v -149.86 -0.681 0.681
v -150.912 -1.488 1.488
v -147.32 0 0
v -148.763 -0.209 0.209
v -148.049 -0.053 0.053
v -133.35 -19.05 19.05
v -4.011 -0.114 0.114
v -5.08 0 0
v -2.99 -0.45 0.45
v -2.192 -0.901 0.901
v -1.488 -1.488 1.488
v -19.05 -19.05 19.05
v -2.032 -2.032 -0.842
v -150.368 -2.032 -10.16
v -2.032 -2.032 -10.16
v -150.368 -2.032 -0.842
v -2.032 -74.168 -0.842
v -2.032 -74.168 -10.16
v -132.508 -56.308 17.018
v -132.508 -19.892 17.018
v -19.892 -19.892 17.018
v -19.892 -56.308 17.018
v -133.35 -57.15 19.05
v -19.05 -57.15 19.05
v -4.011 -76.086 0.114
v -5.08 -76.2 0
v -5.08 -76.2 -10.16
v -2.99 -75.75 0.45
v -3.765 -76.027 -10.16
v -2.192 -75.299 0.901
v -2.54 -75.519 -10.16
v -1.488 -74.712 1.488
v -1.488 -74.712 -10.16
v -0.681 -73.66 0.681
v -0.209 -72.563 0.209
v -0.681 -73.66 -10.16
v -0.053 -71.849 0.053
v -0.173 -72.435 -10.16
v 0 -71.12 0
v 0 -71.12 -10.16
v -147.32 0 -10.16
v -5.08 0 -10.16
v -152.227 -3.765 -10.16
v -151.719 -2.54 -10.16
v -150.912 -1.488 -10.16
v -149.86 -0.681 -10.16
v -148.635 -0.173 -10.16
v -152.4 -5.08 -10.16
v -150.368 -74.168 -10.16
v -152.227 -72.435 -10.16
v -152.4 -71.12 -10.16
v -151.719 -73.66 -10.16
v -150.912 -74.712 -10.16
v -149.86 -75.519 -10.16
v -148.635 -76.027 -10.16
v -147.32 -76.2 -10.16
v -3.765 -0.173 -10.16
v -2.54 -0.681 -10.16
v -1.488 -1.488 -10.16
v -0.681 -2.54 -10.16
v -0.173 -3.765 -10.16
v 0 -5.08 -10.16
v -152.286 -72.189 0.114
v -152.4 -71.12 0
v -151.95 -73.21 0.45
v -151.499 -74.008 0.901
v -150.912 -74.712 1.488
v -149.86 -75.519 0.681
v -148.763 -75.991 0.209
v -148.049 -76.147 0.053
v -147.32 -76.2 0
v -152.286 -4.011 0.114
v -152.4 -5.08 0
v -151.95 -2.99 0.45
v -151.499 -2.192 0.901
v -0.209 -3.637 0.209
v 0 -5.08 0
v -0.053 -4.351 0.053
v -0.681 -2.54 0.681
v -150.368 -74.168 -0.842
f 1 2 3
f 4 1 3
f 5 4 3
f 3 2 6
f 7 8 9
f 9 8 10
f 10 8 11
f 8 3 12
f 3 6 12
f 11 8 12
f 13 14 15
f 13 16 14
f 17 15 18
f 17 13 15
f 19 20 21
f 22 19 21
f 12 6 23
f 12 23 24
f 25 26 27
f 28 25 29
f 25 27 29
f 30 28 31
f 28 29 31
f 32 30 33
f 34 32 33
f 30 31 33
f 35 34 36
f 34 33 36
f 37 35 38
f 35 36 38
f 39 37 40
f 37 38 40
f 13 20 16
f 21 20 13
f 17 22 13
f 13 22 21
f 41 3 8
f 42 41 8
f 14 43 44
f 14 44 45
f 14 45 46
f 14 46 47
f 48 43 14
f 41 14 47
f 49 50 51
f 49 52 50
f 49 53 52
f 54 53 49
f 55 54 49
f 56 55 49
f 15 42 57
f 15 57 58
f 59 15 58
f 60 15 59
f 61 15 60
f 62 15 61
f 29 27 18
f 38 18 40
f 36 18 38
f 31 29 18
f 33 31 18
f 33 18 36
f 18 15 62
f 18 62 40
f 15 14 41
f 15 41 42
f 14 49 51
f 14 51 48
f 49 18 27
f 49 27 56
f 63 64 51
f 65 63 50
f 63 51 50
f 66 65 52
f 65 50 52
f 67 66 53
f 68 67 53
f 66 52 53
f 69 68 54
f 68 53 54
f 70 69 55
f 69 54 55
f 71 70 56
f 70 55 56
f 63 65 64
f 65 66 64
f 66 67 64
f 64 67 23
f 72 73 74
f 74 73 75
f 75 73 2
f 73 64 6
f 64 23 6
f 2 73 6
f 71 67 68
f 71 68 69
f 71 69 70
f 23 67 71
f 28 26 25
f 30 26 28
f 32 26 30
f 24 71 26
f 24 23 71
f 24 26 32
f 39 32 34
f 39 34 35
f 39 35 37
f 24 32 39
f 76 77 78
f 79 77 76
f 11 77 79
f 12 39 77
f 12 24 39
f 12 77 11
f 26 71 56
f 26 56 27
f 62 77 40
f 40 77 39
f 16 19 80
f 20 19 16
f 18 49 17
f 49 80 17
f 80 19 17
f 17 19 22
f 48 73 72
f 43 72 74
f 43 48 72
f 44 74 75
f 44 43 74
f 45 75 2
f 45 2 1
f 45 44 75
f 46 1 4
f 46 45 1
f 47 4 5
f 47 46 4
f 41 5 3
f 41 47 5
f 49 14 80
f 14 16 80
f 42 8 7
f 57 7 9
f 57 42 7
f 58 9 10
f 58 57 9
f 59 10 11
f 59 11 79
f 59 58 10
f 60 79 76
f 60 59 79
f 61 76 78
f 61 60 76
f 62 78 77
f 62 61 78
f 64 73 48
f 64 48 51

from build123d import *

# Parameters (mm, degrees)
F0_W     = 152.4
F0_H     = 76.2
F1_DEPTH = 19.05
F2_SIZE  = 19.04999
F3_W     = 152.4
F3_H     = 76.2
F4_DEPTH = 10.16
F5_T     = -2.032
F6_R     = 5.08


# Not quite as in the source:
# - a fillet or chamfer is up to 0.001 mm smaller than in the source, because OpenCascade refuses the exact size


with BuildPart() as f1:
    # F0 (on Top) → F1 (new body)
    with BuildSketch(Plane.XY):
        with Locations((-76.2, -38.1)):
            Rectangle(F0_W, F0_H)
    extrude(amount=F1_DEPTH)

    # F2 (size 19.05 in the source; OpenCascade refuses exactly that, so slightly less here)
    f2_edges = [f1.edges().sort_by_distance(p)[0] for p in [
        (0, -38.1, 19.05),
        (-76.2, 0, 19.05),
        (-152.4, -38.1, 19.05),
        (-76.2, -76.2, 19.05),
    ]]
    chamfer(f2_edges, length=F2_SIZE)

    # F3 (on face) → F4 (join)
    with BuildSketch(Plane(origin=(0, 0, 0), x_dir=(1, 0, 0), z_dir=(0, 0, -1))):
        with Locations((-76.2, 38.1)):
            Rectangle(F3_W, F3_H)
    extrude(amount=F4_DEPTH)

    # F5
    f5_openings = [f1.faces().sort_by_distance(p)[0] for p in [
        (-76.2, -38.1, -10.16),
    ]]
    offset(amount=F5_T, openings=f5_openings)

    # F6
    f6_edges = [f1.edges().sort_by_distance(p)[0] for p in [
        (0, 0, -5.08),
        (-152.4, 0, -5.08),
        (-152.4, -76.2, -5.08),
        (0, -76.2, -5.08),
    ]]
    fillet(f6_edges, radius=F6_R)


solid = f1.part
